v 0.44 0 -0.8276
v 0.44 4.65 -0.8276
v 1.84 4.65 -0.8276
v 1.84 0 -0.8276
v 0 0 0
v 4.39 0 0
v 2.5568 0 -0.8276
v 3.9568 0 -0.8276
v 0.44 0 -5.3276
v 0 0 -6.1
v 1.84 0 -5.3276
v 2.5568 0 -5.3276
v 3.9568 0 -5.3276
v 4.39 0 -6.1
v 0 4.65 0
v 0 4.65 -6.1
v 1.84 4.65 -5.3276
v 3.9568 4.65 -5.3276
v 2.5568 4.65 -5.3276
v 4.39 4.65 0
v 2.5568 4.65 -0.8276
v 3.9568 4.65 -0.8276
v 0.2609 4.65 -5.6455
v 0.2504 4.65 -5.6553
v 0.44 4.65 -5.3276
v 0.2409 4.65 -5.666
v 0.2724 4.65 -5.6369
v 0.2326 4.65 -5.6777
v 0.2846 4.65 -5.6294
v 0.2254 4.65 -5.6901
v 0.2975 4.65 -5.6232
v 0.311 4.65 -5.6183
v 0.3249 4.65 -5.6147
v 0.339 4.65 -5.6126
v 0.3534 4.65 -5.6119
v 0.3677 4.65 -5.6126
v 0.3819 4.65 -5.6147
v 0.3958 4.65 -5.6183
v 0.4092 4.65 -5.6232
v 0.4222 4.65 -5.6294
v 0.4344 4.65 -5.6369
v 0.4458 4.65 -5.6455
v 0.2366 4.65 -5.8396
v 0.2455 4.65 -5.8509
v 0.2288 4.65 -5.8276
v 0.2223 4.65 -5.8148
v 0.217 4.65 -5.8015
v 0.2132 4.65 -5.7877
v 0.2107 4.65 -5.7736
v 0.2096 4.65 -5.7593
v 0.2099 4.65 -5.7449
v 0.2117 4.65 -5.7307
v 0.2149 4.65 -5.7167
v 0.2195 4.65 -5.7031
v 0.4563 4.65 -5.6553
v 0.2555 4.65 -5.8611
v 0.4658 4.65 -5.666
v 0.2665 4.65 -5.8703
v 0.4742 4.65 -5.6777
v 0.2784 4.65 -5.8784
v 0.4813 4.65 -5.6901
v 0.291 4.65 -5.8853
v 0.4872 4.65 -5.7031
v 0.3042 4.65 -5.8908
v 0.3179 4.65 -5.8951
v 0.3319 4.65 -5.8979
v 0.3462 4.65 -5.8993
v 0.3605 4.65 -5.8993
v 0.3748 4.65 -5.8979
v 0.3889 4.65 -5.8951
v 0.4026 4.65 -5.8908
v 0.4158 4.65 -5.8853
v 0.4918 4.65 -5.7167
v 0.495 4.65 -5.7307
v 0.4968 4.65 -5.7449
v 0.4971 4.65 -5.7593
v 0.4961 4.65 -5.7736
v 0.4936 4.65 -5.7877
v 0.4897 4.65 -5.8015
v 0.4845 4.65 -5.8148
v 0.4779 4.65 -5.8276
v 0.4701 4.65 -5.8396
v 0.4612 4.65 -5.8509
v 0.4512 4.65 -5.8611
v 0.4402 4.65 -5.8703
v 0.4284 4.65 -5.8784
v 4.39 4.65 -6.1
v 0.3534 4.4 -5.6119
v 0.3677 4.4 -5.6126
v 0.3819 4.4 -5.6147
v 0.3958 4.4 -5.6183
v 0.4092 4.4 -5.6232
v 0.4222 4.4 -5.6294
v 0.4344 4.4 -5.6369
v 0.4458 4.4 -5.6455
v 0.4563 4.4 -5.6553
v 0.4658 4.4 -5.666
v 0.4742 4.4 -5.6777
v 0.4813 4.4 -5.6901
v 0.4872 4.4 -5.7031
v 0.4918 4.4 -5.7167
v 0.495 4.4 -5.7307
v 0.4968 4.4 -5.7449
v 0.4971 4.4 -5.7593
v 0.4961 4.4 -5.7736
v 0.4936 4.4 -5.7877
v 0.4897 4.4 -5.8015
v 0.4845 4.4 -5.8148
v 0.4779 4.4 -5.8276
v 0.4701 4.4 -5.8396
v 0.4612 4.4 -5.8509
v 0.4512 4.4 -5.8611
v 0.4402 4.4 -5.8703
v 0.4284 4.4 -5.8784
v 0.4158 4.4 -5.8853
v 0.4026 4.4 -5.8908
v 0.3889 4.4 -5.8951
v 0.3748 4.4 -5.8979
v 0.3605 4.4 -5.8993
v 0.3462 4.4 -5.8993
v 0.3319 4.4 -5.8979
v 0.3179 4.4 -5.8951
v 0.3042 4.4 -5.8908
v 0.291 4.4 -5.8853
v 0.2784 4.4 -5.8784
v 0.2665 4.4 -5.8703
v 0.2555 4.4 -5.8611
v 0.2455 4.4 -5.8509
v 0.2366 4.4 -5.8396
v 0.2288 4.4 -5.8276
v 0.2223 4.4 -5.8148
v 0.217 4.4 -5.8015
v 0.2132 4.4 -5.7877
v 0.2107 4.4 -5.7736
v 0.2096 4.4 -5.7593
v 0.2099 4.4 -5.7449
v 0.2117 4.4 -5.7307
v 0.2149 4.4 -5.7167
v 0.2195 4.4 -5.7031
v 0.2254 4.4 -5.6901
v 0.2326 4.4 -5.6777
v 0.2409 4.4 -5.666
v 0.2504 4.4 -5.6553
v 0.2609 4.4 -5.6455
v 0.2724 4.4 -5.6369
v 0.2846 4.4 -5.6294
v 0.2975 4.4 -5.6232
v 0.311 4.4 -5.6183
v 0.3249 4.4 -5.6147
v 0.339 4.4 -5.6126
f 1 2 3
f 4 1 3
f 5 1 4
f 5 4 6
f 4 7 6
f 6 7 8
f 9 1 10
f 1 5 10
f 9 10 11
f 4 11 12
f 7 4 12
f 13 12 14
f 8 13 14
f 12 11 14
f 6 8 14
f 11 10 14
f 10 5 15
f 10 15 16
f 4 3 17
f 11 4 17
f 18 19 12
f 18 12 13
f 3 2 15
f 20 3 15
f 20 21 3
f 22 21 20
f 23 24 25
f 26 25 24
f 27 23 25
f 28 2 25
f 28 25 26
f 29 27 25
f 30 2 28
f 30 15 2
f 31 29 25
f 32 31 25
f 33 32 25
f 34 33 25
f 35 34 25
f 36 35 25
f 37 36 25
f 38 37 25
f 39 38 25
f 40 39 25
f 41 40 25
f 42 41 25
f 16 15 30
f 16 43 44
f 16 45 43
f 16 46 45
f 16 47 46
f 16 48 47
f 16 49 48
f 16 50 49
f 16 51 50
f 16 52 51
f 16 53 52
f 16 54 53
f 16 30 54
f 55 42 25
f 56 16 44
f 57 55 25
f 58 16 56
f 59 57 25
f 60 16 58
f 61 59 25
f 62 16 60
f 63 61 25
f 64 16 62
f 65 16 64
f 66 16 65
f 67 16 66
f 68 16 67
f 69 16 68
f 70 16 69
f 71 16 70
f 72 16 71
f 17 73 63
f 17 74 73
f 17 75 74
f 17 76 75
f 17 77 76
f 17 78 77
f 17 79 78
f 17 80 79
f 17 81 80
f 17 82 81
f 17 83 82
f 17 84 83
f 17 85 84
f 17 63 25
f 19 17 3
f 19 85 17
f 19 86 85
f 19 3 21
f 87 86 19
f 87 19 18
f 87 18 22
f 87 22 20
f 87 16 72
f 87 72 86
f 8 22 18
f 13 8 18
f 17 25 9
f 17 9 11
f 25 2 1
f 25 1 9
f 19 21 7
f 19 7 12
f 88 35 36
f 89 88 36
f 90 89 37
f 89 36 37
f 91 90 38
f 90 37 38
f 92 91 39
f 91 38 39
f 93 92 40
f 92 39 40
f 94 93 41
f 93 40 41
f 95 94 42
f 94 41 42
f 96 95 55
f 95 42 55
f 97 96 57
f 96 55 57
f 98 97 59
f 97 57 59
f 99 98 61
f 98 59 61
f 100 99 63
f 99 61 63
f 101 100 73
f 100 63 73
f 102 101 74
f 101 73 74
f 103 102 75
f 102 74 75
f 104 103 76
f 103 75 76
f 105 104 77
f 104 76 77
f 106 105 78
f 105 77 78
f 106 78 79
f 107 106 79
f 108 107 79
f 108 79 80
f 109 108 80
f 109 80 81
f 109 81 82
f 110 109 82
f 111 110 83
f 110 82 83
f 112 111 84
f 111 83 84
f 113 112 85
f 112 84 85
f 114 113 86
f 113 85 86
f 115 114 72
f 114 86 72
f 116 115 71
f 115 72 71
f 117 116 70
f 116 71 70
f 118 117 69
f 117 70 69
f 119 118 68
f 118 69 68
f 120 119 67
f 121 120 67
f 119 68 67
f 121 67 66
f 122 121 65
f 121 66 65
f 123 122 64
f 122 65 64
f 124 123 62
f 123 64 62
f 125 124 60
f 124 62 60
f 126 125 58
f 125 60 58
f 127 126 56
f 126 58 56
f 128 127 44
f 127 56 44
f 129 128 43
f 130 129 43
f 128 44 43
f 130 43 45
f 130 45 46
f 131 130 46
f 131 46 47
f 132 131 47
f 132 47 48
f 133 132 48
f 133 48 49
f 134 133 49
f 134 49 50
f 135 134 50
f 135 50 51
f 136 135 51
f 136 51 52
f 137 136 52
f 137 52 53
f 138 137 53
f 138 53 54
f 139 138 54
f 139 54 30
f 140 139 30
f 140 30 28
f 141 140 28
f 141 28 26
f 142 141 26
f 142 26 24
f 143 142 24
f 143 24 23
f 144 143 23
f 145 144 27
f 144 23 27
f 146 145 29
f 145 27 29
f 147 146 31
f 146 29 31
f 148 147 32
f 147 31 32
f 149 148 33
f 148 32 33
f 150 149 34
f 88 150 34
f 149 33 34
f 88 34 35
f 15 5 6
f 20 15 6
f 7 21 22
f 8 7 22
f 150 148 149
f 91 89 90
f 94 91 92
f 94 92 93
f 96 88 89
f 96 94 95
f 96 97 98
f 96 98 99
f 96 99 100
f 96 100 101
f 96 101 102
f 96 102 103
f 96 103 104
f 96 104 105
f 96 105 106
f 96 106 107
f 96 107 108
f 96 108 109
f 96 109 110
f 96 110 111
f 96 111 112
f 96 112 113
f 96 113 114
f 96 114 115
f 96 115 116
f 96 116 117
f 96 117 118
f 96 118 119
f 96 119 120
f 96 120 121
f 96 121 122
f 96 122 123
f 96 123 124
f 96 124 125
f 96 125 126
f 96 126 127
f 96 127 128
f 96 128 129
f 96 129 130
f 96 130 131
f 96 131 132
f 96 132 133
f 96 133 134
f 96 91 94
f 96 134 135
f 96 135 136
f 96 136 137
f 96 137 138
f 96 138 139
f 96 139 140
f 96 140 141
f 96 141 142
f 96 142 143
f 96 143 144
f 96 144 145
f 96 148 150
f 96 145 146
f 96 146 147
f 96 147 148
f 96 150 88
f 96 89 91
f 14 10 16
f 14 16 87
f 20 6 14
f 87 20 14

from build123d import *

# Parameters (mm, degrees)
CROQUIS1_W              = 4.39
CROQUIS1_H              = 6.1
SALIENTE_EXTRUIR1_DEPTH = 4.65
CROQUIS3_W              = 1.4
CROQUIS3_H              = 4.5
CORTAR_EXTRUIR1_DEPTH   = 9.837680691
CROQUIS4_R              = 0.143820832
CORTAR_EXTRUIR2_DEPTH   = 0.25


with BuildPart() as part:
    # Croquis1 → Saliente-Extruir1 (new body)
    with BuildSketch(Plane(origin=(0, 0, 0), x_dir=(1, 0, 0), z_dir=(0, 1, 0))):
        with Locations((2.195, 3.05)):
            Rectangle(CROQUIS1_W, CROQUIS1_H)
    extrude(amount=SALIENTE_EXTRUIR1_DEPTH)

    # Croquis3 → Cortar-Extruir1 (cut, through all)
    with BuildSketch(Plane(origin=(0, 4.65, 0), x_dir=(1, 0, 0), z_dir=(0, 1, 0))):
        with Locations((1.14, 3.077612144)):
            Rectangle(CROQUIS3_W, CROQUIS3_H)
        with Locations((3.256764551, 3.077612144)):
            Rectangle(CROQUIS3_W, CROQUIS3_H)
    extrude(amount=-CORTAR_EXTRUIR1_DEPTH, mode=Mode.SUBTRACT)

    # Croquis4 → Cortar-Extruir2 (cut)
    with BuildSketch(Plane(origin=(0, 4.65, 0), x_dir=(1, 0, 0), z_dir=(0, 1, 0))):
        with Locations(Location((0.353367476, 5.755686139, 0), (0, 0, 270))):
            Circle(CROQUIS4_R)
    extrude(amount=-CORTAR_EXTRUIR2_DEPTH, mode=Mode.SUBTRACT)


solid = part.part
